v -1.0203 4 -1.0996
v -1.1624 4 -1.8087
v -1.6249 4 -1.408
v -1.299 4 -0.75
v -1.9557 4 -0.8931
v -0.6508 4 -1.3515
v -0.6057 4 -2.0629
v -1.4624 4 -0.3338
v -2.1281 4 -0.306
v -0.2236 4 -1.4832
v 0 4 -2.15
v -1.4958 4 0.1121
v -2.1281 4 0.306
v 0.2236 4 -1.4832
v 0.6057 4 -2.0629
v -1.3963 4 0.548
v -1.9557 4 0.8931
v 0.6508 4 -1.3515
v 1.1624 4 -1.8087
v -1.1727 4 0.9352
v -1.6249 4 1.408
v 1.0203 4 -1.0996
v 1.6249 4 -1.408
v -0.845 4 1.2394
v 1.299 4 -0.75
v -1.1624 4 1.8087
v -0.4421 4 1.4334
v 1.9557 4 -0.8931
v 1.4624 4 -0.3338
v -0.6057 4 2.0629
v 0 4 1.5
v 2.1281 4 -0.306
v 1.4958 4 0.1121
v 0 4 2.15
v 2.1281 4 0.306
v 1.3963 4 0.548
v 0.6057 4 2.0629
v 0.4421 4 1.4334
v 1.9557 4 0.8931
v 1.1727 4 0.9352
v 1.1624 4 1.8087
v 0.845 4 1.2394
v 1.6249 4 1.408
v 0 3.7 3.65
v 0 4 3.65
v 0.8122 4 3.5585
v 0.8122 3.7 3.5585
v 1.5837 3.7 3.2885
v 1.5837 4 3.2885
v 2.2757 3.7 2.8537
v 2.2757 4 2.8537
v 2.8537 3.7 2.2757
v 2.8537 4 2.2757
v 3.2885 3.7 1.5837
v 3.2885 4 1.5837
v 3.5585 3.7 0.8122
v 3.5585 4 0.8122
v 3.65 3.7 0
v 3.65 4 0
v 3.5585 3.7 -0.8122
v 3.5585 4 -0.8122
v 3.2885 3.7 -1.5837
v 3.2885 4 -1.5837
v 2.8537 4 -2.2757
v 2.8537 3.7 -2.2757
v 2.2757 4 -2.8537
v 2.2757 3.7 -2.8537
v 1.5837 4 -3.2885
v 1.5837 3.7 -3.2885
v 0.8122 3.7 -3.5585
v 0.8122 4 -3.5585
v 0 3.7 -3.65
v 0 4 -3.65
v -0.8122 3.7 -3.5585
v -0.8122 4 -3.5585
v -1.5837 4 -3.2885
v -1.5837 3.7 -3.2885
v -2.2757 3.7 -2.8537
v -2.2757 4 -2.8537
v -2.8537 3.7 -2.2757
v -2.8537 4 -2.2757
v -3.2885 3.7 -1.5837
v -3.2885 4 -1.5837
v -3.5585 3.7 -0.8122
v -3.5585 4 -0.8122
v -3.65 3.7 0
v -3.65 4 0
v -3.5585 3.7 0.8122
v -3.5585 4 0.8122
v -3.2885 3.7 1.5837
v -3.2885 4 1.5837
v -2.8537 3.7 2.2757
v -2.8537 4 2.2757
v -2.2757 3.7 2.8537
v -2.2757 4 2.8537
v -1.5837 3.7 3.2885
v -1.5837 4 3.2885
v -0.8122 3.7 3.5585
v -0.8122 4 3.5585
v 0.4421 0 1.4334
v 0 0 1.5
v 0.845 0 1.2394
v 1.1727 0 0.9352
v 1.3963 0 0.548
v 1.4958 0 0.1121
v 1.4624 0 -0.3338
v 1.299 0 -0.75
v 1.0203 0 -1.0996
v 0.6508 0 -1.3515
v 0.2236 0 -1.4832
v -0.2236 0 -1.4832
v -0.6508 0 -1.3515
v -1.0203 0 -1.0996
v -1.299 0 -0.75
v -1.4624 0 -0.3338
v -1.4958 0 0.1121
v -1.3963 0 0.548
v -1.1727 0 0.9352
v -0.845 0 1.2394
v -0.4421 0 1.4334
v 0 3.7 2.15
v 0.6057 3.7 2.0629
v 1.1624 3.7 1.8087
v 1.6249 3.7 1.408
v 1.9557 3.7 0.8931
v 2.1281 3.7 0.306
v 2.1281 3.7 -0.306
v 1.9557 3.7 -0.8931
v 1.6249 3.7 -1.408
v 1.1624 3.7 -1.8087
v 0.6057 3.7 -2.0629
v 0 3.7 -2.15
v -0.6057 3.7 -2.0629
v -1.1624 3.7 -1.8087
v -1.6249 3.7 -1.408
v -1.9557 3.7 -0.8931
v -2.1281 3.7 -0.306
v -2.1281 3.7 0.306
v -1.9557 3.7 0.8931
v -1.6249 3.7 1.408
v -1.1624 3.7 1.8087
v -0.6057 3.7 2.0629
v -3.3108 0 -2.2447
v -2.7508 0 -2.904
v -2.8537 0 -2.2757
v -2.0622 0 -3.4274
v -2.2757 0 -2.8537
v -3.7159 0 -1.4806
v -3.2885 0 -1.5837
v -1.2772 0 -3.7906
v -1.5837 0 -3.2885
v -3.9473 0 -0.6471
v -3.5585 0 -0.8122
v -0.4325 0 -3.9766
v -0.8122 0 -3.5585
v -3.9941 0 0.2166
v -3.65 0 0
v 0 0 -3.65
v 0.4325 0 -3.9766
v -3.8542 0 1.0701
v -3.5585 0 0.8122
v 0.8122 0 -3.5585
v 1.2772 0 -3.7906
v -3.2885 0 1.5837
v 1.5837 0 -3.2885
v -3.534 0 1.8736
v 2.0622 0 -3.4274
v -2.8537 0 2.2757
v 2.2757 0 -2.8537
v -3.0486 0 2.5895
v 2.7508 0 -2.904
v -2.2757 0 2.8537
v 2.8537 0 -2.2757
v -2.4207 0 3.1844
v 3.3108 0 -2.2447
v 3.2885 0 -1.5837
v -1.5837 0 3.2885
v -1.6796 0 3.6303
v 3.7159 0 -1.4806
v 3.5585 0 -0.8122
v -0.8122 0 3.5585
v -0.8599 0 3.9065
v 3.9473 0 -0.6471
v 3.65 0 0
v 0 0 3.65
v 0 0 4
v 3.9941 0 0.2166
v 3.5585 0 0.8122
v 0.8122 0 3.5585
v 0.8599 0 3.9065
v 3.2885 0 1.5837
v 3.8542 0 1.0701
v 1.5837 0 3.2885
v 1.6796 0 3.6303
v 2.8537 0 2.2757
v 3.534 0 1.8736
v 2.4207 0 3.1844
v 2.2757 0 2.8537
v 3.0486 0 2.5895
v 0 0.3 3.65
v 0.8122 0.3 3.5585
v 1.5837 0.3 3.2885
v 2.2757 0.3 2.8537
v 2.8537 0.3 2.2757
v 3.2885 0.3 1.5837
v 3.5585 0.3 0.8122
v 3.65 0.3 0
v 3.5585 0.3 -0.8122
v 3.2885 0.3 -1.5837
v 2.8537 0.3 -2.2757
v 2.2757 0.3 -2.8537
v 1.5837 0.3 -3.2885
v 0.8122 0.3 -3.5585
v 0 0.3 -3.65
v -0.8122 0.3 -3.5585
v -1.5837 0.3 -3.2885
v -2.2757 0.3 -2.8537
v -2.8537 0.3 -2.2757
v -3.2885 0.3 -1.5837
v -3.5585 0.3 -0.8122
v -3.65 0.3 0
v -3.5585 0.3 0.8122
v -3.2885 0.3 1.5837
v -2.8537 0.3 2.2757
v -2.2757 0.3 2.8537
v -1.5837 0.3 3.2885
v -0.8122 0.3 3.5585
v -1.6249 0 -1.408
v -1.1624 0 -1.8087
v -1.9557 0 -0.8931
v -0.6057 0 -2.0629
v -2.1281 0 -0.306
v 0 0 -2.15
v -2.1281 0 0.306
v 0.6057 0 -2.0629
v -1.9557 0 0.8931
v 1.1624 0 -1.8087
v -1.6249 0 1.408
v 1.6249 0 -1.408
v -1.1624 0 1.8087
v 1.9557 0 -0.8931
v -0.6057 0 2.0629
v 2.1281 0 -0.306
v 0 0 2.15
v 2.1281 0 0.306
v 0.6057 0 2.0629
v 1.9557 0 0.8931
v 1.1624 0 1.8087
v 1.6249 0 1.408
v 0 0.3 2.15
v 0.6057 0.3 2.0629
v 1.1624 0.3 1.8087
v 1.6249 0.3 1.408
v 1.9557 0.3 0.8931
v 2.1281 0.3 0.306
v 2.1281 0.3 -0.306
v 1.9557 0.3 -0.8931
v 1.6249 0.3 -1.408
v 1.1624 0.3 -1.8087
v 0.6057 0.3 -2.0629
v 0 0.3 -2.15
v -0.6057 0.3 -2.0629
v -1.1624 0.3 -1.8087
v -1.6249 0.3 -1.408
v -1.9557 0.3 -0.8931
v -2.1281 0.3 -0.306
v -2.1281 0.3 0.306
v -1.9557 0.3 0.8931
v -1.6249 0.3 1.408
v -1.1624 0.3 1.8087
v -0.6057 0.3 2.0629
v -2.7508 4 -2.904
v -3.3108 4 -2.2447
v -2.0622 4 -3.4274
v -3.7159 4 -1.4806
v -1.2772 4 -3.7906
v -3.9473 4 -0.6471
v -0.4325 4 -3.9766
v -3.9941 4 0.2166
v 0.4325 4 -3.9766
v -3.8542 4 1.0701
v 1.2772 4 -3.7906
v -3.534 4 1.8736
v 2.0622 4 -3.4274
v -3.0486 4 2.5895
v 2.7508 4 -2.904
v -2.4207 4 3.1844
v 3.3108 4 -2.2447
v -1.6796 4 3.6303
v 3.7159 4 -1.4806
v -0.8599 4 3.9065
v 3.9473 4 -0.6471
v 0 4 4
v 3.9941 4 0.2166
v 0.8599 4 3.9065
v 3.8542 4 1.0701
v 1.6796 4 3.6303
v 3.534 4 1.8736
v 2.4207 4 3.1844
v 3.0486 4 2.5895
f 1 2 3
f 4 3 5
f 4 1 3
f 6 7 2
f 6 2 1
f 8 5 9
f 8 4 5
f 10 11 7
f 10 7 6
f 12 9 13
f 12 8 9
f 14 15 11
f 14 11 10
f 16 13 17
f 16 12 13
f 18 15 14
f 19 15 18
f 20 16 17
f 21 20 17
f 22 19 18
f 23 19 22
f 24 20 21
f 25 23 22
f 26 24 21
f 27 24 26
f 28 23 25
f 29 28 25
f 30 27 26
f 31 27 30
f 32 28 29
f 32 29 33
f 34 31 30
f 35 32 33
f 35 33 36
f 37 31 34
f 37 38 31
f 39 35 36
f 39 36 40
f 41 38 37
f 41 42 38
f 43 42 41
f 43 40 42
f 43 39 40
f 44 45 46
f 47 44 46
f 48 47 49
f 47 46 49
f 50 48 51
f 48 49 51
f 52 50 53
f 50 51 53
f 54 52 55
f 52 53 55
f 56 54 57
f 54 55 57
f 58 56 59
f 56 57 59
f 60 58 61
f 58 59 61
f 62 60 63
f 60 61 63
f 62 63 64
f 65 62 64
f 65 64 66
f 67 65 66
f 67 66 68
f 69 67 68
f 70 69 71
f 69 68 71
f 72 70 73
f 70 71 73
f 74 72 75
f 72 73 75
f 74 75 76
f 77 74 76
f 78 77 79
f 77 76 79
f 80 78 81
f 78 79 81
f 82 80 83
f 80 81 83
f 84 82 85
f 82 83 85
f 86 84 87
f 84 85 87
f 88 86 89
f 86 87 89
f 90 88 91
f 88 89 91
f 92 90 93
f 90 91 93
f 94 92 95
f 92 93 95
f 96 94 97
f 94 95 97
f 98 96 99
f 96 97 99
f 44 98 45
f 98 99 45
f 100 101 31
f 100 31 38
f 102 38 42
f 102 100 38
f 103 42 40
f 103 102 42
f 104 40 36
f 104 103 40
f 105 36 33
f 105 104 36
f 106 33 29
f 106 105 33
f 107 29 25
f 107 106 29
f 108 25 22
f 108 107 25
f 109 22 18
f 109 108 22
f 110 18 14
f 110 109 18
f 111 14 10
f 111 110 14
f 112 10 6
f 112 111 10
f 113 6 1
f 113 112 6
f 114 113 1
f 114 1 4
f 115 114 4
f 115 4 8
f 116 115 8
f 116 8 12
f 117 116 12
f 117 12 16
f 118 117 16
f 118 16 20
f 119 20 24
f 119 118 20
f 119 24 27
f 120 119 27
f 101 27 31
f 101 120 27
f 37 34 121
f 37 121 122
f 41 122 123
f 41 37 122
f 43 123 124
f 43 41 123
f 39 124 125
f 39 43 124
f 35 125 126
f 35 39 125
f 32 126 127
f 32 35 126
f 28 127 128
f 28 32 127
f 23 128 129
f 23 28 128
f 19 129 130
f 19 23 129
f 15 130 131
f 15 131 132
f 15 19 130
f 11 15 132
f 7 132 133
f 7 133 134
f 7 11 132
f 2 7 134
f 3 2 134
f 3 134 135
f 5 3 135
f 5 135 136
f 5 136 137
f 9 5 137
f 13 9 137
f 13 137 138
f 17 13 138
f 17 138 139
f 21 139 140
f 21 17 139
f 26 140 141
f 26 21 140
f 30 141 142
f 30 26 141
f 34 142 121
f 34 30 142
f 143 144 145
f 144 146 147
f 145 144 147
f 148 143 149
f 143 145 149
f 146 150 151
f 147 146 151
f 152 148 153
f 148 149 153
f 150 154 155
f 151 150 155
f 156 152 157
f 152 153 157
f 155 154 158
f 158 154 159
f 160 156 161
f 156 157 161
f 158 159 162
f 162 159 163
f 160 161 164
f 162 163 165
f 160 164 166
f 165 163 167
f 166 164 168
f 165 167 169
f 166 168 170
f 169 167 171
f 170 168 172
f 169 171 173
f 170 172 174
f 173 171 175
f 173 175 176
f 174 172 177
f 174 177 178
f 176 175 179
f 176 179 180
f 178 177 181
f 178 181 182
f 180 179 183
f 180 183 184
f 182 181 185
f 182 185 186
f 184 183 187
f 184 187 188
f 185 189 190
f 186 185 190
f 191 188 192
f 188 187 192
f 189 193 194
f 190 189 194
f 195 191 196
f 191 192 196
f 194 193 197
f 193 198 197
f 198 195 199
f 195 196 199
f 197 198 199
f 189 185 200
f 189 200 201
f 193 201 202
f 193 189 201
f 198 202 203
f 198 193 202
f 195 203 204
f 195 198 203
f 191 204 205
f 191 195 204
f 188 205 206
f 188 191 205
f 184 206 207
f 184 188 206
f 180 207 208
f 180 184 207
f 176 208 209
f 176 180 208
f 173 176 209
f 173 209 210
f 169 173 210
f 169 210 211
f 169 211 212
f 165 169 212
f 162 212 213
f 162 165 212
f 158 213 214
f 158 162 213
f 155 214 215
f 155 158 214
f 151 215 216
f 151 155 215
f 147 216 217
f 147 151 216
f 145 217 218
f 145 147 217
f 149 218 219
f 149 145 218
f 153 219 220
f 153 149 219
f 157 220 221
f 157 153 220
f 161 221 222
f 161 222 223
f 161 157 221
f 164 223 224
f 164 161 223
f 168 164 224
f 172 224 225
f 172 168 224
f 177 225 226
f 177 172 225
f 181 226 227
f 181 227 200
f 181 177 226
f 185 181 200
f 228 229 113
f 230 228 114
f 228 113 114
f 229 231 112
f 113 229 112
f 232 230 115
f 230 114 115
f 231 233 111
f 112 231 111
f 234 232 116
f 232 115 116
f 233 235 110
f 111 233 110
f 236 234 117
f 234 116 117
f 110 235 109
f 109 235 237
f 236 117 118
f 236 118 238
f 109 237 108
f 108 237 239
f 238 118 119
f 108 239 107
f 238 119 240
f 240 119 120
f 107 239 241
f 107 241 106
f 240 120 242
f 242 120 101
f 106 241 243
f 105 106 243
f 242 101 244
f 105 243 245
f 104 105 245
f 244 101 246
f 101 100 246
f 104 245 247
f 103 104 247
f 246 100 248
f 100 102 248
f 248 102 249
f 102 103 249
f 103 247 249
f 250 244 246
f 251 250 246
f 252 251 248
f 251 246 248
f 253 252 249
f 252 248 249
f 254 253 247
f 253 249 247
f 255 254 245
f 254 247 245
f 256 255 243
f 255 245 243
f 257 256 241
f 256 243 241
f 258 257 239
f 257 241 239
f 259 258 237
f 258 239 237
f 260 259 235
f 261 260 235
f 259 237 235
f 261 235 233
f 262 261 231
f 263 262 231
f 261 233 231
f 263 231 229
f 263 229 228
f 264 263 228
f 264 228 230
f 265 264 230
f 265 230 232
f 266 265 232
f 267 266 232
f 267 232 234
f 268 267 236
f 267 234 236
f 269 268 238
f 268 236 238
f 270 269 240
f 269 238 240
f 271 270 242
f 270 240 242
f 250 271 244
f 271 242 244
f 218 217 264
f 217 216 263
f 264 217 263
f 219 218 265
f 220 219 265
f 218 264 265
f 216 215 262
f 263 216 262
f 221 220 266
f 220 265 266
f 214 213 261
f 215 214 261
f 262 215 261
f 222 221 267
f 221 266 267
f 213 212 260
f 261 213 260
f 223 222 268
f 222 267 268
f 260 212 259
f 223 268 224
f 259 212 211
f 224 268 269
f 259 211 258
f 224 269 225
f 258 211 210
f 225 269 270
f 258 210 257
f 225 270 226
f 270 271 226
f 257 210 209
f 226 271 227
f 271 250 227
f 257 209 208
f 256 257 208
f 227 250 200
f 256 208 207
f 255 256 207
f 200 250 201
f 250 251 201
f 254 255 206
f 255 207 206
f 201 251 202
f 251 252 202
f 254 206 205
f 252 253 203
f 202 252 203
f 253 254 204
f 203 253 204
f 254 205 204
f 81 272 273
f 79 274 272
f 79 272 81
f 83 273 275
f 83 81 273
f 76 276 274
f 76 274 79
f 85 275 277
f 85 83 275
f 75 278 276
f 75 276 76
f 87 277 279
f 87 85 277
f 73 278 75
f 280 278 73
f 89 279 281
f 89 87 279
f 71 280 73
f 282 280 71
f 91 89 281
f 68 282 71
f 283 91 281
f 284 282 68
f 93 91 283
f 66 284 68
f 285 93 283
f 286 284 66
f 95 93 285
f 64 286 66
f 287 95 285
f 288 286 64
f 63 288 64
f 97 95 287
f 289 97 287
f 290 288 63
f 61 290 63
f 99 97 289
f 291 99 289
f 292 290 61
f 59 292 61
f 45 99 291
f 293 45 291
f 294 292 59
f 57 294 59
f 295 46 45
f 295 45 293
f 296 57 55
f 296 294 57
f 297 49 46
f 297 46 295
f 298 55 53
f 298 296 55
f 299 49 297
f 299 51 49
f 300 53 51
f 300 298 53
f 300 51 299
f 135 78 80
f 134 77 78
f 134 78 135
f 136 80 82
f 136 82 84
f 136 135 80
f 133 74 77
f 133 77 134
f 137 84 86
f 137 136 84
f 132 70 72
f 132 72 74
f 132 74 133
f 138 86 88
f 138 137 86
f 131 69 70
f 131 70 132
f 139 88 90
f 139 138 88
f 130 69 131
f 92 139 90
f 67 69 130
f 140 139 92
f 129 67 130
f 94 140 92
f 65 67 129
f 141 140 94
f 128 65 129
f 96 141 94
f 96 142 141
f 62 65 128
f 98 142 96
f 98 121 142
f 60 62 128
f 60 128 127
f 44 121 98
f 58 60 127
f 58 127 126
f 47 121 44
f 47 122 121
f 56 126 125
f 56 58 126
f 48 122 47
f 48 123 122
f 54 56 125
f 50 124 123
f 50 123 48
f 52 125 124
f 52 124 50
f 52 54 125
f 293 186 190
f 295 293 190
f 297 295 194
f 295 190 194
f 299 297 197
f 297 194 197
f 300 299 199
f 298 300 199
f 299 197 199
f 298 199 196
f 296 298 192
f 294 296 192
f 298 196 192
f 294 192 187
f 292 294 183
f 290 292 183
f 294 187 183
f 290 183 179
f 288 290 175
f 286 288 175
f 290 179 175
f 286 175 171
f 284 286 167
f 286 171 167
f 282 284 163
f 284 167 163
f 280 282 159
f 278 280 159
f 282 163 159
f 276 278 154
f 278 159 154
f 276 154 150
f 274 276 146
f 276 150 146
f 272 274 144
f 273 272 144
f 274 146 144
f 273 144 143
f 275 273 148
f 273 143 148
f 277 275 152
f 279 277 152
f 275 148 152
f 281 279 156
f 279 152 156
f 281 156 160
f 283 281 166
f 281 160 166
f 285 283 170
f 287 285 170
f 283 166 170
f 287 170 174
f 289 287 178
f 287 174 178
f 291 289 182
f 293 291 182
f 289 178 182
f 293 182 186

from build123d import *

# Parameters (mm, degrees)
SKETCH1_R              = 4
SKETCH1_R_2            = 1.5
BASE_SIZE_DEPTH        = 4
SKETCH2_R              = 3.65
SKETCH2_R_2            = 2.15
BEARING_FEATURES_DEPTH = 0.3


with BuildPart() as part:
    # Sketch1 → Base size (new body)
    with BuildSketch(Plane(origin=(0, 0, 0), x_dir=(1, 0, 0), z_dir=(0, 1, 0))):
        with Locations(Location((0, 0, 0), (0, 0, 270))):
            Circle(SKETCH1_R)
        with Locations(Location((0, 0, 0), (0, 0, 270))):
            Circle(SKETCH1_R_2, mode=Mode.SUBTRACT)
    extrude(amount=BASE_SIZE_DEPTH)

    # Sketch2 → Bearing features (cut)
    with BuildSketch(Plane(origin=(0, 4, 0), x_dir=(1, 0, 0), z_dir=(0, 1, 0))):
        with Locations(Location((0, 0, 0), (0, 0, 270))):
            Circle(SKETCH2_R)
        with Locations(Location((0, 0, 0), (0, 0, 270))):
            Circle(SKETCH2_R_2, mode=Mode.SUBTRACT)
    bearing_features = extrude(amount=-BEARING_FEATURES_DEPTH, mode=Mode.SUBTRACT)

    # Mirror1: Bearing features across plane
    add(bearing_features.mirror(Plane.ZX.offset(2)), mode=Mode.SUBTRACT)


solid = part.part
